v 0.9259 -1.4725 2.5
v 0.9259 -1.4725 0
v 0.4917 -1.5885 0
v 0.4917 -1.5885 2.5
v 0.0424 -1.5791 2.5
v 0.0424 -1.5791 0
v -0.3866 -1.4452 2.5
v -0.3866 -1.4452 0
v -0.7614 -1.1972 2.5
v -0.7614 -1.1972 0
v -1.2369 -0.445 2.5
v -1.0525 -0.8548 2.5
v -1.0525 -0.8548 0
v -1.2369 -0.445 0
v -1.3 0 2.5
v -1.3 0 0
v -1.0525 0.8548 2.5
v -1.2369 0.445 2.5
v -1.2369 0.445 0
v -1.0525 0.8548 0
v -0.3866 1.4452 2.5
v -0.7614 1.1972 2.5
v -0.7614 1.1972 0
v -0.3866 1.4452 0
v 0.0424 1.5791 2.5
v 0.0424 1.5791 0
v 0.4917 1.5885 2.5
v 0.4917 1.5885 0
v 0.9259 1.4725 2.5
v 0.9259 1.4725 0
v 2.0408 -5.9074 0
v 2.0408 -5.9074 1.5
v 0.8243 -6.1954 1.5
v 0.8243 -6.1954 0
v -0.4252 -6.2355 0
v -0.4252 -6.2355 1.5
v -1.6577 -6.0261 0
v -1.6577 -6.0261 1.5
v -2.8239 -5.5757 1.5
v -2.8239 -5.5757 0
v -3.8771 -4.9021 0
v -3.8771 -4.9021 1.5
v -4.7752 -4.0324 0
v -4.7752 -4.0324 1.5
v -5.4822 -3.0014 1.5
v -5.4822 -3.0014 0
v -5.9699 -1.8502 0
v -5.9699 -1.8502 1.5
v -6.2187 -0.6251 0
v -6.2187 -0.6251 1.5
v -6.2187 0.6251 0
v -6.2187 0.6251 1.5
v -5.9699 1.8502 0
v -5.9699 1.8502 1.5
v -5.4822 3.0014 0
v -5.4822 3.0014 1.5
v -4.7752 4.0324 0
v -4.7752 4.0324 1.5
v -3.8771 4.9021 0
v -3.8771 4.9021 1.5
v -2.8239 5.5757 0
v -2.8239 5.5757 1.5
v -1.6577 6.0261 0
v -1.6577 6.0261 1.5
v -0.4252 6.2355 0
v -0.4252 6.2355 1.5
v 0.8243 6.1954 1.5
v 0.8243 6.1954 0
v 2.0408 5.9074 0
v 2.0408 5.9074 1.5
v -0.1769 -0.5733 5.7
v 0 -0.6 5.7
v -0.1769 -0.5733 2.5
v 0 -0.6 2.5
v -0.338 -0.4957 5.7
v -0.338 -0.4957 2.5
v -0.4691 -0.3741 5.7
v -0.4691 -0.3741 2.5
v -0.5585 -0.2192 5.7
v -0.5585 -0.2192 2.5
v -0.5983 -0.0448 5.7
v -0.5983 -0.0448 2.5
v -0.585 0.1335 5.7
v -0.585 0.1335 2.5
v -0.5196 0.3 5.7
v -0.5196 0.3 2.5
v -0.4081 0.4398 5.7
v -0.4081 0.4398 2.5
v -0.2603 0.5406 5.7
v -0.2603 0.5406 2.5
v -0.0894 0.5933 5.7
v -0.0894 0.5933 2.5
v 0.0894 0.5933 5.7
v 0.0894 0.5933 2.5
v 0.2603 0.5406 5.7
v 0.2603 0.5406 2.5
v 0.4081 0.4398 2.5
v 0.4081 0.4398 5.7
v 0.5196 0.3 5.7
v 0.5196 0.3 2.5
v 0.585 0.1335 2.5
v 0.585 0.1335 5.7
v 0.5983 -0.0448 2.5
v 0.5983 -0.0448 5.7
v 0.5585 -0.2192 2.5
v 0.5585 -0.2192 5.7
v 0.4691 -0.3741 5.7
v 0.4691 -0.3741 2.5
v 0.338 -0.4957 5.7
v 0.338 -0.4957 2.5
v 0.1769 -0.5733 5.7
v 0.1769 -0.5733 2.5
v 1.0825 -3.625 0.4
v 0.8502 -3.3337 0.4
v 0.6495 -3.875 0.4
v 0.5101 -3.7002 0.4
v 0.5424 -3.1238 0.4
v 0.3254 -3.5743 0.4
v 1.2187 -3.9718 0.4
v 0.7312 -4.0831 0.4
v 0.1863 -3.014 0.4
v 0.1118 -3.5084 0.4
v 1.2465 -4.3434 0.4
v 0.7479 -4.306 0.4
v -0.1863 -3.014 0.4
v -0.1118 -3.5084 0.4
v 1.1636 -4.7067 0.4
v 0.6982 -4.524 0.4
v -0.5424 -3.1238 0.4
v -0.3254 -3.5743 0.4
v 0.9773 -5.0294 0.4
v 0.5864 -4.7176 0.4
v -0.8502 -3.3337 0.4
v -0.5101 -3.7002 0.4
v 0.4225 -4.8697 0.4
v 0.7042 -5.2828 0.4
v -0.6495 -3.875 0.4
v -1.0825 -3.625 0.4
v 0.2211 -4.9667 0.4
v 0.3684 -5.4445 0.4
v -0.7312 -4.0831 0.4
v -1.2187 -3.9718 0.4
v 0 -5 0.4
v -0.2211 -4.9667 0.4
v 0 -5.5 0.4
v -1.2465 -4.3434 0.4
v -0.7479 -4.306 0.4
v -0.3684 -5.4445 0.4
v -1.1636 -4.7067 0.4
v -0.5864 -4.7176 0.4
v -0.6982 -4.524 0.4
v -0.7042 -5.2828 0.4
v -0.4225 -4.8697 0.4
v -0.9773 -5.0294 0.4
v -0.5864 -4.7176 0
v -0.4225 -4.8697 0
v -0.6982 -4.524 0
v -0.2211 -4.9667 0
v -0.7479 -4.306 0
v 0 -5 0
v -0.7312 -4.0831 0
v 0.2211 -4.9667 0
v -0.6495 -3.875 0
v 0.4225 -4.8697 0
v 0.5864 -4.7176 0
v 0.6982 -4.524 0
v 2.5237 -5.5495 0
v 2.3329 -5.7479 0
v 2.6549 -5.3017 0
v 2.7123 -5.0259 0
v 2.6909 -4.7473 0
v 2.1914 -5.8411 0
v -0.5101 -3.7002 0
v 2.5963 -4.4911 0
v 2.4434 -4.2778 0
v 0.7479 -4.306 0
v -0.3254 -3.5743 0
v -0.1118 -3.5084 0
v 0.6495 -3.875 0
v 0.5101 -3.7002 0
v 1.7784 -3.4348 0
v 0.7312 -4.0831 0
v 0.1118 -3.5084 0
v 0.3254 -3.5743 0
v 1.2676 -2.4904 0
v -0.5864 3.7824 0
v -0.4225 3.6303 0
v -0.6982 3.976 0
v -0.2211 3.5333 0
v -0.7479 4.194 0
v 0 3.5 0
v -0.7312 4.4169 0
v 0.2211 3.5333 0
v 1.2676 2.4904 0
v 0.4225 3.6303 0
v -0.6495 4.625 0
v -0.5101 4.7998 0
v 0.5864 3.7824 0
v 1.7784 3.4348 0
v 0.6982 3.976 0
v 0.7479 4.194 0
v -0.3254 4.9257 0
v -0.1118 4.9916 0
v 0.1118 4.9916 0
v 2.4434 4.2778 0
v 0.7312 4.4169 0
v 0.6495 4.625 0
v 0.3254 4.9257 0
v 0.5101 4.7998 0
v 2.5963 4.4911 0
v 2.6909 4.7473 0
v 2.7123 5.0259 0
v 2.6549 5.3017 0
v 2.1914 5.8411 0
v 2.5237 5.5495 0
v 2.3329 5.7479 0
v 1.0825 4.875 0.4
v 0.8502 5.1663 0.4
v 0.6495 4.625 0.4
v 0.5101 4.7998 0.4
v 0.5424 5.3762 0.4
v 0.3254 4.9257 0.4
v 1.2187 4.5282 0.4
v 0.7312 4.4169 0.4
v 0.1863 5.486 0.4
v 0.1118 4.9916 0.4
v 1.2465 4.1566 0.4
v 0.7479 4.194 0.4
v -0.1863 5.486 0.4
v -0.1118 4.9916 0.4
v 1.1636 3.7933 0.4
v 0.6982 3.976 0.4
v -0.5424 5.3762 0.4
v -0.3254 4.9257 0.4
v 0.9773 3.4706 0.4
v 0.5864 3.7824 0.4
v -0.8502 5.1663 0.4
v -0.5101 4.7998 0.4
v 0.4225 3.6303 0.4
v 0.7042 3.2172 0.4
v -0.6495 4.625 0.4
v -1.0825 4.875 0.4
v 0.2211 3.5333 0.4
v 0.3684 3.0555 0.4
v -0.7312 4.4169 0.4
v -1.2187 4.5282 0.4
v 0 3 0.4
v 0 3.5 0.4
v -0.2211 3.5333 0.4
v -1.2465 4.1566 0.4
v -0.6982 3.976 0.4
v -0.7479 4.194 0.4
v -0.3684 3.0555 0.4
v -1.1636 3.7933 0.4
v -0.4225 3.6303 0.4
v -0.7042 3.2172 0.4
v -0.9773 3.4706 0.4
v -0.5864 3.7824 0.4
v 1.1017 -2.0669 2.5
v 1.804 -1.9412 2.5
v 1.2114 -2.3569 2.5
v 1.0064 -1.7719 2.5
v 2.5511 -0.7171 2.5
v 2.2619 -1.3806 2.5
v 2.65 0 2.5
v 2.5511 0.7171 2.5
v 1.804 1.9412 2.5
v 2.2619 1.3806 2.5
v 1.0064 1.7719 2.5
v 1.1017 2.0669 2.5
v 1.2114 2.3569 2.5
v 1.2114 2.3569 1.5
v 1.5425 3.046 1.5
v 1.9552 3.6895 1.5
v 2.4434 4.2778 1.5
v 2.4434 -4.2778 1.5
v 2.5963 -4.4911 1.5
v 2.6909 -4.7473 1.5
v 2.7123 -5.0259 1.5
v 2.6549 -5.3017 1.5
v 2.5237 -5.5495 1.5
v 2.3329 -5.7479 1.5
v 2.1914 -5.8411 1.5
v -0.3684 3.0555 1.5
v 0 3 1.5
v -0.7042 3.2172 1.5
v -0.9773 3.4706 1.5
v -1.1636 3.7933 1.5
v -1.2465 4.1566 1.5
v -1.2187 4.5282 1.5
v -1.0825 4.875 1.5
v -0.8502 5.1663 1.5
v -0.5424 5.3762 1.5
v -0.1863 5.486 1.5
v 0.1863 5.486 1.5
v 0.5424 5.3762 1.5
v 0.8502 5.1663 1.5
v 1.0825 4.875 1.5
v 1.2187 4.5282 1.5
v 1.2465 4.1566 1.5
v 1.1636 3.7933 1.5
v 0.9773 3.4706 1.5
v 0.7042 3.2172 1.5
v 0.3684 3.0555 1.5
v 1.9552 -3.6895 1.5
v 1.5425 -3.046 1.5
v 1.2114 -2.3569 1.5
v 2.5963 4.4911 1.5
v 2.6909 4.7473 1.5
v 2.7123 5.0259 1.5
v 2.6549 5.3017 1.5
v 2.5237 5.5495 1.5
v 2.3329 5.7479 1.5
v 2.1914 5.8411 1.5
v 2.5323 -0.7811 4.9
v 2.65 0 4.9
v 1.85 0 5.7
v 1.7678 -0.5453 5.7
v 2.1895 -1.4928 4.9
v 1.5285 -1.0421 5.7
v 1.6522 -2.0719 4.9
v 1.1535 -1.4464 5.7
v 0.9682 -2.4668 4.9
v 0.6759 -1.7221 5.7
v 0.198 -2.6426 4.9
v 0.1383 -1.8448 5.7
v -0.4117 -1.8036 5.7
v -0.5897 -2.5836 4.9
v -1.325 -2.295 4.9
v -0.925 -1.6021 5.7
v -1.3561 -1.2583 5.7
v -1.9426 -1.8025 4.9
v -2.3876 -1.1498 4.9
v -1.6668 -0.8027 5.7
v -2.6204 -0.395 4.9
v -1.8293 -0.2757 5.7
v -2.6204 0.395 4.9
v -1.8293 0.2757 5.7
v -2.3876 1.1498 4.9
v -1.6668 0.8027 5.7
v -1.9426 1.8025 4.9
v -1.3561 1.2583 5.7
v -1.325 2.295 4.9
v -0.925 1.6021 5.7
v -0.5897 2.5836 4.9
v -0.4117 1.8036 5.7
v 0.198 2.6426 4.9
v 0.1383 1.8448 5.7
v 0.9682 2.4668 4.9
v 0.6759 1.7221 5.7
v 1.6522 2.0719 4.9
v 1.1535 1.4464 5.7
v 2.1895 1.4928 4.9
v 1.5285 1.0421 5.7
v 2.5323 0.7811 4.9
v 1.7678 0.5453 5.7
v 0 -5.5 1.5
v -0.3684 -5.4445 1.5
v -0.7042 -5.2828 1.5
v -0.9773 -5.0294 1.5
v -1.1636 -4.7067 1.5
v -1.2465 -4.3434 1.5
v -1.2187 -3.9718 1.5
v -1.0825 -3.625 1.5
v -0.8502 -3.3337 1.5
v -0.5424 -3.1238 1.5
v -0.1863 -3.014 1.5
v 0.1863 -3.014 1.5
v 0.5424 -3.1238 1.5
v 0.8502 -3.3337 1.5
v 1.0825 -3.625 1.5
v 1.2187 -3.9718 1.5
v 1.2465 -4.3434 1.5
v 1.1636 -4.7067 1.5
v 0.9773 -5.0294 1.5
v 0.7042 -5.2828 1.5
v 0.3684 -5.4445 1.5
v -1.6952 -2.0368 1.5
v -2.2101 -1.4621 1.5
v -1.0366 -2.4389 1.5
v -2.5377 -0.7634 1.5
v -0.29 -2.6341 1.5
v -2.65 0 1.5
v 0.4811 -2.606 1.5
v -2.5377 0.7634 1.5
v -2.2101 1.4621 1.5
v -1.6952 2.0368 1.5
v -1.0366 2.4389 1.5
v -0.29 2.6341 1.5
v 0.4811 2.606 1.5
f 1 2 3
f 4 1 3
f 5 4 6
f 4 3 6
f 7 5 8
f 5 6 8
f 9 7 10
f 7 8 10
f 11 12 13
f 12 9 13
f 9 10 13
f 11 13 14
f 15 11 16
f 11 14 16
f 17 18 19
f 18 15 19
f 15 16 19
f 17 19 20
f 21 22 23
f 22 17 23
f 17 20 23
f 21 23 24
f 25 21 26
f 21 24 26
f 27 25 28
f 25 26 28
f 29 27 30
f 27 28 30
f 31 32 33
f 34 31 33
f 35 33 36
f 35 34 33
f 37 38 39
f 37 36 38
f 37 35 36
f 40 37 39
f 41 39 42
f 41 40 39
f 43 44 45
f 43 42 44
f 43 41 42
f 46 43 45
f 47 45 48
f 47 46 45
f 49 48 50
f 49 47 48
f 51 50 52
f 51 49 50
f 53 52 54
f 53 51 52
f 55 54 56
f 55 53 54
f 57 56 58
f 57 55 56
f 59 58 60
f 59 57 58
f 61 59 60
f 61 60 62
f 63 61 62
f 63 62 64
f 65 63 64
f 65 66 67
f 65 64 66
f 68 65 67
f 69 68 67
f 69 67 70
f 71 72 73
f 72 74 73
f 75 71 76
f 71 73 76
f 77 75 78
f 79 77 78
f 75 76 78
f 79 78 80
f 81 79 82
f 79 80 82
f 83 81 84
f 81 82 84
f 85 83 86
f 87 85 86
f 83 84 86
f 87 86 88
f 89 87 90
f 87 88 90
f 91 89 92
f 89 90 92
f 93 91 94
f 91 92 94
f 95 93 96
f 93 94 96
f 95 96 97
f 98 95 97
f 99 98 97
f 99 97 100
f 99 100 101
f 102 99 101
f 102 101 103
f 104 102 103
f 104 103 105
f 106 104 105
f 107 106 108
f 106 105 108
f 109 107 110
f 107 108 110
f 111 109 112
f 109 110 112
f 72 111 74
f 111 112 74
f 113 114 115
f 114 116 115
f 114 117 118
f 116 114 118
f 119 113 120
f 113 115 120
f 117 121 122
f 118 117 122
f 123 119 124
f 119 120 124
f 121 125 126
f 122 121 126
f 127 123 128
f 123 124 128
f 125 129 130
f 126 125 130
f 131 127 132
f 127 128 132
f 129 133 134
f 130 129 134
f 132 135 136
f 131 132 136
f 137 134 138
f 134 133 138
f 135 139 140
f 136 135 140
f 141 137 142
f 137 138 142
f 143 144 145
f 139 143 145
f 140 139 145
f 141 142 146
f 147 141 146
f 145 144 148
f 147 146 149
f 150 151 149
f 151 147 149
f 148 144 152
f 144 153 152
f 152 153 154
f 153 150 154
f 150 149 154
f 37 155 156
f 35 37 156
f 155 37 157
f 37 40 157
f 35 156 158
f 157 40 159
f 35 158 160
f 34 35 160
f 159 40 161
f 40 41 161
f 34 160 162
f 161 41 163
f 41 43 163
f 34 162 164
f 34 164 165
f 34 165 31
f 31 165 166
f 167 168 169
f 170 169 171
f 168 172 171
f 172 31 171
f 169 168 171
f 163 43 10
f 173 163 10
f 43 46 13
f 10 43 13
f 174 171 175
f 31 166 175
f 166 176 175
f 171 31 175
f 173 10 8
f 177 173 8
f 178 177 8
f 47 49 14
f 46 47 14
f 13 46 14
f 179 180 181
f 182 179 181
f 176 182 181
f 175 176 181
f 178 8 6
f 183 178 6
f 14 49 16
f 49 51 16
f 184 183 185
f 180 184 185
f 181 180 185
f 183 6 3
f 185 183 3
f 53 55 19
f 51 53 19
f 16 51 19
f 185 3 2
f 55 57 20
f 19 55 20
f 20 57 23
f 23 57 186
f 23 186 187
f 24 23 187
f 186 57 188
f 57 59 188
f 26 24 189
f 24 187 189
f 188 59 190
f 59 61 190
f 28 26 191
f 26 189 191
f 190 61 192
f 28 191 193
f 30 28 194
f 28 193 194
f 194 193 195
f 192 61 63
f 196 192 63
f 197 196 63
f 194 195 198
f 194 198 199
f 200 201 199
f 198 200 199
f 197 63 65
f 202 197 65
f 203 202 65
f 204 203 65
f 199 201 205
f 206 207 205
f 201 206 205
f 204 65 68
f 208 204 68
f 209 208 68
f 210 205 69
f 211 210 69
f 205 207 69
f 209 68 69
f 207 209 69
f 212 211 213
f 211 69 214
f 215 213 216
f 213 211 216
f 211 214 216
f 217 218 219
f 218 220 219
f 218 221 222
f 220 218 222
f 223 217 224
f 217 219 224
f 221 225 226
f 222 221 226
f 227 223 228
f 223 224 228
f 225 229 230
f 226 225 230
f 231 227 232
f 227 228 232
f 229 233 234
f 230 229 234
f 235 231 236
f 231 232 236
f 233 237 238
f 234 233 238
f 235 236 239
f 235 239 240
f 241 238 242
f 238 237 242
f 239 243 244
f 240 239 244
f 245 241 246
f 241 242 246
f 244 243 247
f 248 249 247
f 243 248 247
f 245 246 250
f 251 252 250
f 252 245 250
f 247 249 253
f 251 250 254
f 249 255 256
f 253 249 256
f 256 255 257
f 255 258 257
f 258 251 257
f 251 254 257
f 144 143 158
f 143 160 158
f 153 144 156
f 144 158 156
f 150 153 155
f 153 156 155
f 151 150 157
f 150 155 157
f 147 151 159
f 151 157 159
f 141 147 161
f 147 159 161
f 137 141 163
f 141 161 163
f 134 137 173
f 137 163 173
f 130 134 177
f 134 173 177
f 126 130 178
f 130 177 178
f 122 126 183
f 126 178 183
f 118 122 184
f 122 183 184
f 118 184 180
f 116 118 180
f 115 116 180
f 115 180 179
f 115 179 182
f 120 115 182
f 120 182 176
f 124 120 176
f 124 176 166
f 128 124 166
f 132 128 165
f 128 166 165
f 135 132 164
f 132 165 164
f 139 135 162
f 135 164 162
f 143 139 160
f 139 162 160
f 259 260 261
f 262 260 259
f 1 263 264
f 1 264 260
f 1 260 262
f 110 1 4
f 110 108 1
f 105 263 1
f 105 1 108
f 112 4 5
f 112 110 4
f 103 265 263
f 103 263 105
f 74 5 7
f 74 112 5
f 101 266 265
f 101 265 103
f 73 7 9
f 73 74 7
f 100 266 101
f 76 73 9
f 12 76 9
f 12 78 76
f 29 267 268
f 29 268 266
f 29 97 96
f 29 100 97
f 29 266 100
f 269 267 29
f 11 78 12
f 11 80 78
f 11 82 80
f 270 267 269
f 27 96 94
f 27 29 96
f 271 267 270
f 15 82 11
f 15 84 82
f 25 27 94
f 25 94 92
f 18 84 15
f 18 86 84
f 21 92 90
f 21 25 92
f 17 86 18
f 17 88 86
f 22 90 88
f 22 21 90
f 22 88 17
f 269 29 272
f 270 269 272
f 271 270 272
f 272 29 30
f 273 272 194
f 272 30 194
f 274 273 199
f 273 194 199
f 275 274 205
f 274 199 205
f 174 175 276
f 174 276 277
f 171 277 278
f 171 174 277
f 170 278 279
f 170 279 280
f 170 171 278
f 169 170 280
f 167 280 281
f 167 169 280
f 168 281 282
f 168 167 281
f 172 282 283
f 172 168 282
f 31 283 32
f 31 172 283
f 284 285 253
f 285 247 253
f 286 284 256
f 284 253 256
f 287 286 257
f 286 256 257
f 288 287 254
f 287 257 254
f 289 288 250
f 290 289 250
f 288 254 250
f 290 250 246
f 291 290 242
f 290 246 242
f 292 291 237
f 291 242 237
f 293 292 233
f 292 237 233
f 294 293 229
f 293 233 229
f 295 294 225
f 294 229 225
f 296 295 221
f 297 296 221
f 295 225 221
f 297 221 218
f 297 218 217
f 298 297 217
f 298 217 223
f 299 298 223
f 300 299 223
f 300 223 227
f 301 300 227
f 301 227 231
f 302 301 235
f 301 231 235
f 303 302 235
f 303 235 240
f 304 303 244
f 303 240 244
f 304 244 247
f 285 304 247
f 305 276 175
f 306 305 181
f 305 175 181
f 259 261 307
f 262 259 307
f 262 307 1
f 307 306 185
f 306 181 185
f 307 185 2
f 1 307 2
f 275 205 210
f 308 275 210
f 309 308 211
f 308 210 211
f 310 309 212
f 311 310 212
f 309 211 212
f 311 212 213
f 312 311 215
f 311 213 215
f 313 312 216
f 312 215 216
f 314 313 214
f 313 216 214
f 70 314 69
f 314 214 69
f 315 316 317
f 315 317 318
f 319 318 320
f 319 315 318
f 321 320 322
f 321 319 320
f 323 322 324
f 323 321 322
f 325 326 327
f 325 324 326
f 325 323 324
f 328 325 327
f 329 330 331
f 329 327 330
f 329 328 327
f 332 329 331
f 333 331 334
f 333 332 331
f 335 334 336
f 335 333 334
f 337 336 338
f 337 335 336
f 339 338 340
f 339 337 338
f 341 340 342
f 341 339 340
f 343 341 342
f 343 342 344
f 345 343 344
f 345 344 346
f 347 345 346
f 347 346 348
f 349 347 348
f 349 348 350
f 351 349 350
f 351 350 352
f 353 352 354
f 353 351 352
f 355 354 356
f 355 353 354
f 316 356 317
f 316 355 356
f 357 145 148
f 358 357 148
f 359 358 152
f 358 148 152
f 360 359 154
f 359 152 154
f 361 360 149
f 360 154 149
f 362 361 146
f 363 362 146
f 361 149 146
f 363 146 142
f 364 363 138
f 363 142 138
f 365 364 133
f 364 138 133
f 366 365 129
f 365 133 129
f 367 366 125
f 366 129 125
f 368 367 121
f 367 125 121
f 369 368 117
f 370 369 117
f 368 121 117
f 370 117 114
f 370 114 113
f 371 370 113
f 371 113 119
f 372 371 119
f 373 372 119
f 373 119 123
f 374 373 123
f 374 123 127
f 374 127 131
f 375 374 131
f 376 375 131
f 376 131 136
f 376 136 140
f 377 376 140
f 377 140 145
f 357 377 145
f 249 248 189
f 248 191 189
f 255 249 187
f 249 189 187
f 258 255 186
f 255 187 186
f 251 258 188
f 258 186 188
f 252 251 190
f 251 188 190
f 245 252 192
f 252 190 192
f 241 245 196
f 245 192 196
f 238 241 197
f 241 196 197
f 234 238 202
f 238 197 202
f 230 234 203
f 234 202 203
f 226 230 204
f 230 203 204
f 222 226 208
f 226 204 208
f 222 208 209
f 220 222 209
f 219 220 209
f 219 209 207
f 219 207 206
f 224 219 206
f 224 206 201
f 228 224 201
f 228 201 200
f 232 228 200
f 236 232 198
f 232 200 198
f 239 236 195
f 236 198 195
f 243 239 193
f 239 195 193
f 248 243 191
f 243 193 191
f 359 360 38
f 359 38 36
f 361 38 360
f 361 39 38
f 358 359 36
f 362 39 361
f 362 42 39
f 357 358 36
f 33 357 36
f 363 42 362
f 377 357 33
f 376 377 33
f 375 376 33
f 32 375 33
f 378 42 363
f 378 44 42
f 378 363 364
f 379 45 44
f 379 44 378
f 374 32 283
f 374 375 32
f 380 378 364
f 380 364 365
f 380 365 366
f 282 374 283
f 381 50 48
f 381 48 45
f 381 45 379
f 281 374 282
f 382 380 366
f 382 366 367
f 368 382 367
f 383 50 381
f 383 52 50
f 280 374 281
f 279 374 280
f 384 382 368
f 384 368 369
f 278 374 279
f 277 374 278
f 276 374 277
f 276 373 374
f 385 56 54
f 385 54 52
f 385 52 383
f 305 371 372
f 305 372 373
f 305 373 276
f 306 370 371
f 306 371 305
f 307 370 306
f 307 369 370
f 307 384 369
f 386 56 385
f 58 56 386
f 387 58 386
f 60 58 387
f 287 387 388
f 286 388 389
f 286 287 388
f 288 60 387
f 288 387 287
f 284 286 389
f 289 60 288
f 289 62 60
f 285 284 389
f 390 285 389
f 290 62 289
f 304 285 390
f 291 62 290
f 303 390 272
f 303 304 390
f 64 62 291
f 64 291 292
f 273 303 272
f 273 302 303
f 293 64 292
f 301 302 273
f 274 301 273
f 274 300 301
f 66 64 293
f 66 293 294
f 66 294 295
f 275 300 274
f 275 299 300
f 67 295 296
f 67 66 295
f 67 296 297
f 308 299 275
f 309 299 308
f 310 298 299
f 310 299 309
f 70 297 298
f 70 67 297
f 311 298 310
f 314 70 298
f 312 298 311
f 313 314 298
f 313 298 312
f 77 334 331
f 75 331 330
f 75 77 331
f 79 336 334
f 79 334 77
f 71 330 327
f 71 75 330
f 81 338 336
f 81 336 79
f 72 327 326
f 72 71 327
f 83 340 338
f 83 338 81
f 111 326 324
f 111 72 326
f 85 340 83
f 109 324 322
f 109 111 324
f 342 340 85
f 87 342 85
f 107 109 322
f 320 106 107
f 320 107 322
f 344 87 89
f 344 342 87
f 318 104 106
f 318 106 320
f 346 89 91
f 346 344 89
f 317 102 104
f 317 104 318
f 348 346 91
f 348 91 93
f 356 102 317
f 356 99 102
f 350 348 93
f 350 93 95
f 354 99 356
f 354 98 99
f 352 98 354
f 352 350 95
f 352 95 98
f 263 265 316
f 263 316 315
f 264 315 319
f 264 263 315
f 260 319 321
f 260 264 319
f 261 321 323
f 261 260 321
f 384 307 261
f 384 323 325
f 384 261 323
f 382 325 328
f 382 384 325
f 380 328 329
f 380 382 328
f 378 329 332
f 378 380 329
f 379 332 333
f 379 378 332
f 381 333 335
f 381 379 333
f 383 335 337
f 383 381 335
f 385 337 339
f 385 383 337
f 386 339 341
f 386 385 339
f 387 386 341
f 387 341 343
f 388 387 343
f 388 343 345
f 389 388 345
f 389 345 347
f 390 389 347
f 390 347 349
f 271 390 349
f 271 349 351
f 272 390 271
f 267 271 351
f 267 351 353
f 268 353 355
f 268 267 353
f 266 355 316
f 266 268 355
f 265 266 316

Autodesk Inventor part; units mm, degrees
ref_plane "YZ Plane" through (0, 0, 0) normal (1, 0, 0) x (0, 1, 0)
ref_plane "XZ Plane" through (0, 0, 0) normal (0, 1, 0) x (-1, 0, 0)
ref_plane "XY Plane" through (0, 0, 0) normal (0, 0, 1) x (1, 0, 0)
sketch "Sketch1" plane through (0, 0, 0) normal (0, 0, 1) x (1, 0, 0)
  circle A0 centre (0, 0) radius 6.25
  dimension "d0" = 12.5
extrude "Extrusion1" add sketch "Sketch1" along normal blind 1.5
sketch "axles" plane through (0, 0, 0) normal (0, 0, 1) x (1, 0, 0)
  point P0 (0, 0)
  point P1 (7, 0)
  point P2 (0.3, 0)
  dimension "d3" = 7
  dimension "d4" = 6.7
sketch "Sketch4" plane through (0, 0, 1.5) normal (0, 0, 1) x (1, 0, 0)
  circle A0 centre (0, 0) radius 2.65
  dimension "d8" = 5.3
extrude "Extrusion3" add sketch "Sketch4" along normal blind 4.2
chamfer "Chamfer1" distance 0.8 angle 45 1 edges at (-2.65, 0, 5.7)
sketch "Sketch5" plane through (0, 0, 0) normal (0, 0, 1) x (1, 0, 0)
  circle A0 centre (0.3, 0) radius 1.6
  point P0 (0, 0)
  dimension "d14" = 3.2
extrude "motor shaft" cut sketch "Sketch5" along normal blind 2.5
sketch "Sketch6" plane through (0, 0, 0) normal (0, 0, -1) x (-1, 0, 0)
  circle A0 centre (-7, 0) radius 6.25
  point P0 (0, 0)
  dimension "d17" = 12.5
extrude "Extrusion5" cut sketch "Sketch6" against normal blind 2.5
sketch "Sketch8" plane through (0, 0, 5.7) normal (0, 0, 1) x (1, 0, 0)
  point P0 (0, 0)
  point P1 (0, 0)
hole "Hole1" at (0, 0, 5.7) direction (0, 0, -1) diameter 1.2 end through all
fillet "Fillet1" radius 1 2 edges at (3.5, 5.1781, 0.75) (3.5, -5.1781, 0.75)
sketch "Sketch9" plane through (0, 0, 1.5) normal (0, 0, 1) x (1, 0, 0)
  line L0 (0, -4.25) -> (0, 4.25) construction
  point P0 (0, 0)
  point P1 (0, 0)
  dimension "d28" = 8.5
hole "Hole2" at (0, -4.25, 1.5) at (0, 4.25, 1.5) direction (0, 0, -1) diameter 1.5 end through all counterbore diameter 2.5 counterbore depth 1.1
equation "\"axle_dist_2_3__3_4\" = 7"
equation "\"axle_dist_1_2\" = 6.7"
properties part number "gearbox_axle3_support"
